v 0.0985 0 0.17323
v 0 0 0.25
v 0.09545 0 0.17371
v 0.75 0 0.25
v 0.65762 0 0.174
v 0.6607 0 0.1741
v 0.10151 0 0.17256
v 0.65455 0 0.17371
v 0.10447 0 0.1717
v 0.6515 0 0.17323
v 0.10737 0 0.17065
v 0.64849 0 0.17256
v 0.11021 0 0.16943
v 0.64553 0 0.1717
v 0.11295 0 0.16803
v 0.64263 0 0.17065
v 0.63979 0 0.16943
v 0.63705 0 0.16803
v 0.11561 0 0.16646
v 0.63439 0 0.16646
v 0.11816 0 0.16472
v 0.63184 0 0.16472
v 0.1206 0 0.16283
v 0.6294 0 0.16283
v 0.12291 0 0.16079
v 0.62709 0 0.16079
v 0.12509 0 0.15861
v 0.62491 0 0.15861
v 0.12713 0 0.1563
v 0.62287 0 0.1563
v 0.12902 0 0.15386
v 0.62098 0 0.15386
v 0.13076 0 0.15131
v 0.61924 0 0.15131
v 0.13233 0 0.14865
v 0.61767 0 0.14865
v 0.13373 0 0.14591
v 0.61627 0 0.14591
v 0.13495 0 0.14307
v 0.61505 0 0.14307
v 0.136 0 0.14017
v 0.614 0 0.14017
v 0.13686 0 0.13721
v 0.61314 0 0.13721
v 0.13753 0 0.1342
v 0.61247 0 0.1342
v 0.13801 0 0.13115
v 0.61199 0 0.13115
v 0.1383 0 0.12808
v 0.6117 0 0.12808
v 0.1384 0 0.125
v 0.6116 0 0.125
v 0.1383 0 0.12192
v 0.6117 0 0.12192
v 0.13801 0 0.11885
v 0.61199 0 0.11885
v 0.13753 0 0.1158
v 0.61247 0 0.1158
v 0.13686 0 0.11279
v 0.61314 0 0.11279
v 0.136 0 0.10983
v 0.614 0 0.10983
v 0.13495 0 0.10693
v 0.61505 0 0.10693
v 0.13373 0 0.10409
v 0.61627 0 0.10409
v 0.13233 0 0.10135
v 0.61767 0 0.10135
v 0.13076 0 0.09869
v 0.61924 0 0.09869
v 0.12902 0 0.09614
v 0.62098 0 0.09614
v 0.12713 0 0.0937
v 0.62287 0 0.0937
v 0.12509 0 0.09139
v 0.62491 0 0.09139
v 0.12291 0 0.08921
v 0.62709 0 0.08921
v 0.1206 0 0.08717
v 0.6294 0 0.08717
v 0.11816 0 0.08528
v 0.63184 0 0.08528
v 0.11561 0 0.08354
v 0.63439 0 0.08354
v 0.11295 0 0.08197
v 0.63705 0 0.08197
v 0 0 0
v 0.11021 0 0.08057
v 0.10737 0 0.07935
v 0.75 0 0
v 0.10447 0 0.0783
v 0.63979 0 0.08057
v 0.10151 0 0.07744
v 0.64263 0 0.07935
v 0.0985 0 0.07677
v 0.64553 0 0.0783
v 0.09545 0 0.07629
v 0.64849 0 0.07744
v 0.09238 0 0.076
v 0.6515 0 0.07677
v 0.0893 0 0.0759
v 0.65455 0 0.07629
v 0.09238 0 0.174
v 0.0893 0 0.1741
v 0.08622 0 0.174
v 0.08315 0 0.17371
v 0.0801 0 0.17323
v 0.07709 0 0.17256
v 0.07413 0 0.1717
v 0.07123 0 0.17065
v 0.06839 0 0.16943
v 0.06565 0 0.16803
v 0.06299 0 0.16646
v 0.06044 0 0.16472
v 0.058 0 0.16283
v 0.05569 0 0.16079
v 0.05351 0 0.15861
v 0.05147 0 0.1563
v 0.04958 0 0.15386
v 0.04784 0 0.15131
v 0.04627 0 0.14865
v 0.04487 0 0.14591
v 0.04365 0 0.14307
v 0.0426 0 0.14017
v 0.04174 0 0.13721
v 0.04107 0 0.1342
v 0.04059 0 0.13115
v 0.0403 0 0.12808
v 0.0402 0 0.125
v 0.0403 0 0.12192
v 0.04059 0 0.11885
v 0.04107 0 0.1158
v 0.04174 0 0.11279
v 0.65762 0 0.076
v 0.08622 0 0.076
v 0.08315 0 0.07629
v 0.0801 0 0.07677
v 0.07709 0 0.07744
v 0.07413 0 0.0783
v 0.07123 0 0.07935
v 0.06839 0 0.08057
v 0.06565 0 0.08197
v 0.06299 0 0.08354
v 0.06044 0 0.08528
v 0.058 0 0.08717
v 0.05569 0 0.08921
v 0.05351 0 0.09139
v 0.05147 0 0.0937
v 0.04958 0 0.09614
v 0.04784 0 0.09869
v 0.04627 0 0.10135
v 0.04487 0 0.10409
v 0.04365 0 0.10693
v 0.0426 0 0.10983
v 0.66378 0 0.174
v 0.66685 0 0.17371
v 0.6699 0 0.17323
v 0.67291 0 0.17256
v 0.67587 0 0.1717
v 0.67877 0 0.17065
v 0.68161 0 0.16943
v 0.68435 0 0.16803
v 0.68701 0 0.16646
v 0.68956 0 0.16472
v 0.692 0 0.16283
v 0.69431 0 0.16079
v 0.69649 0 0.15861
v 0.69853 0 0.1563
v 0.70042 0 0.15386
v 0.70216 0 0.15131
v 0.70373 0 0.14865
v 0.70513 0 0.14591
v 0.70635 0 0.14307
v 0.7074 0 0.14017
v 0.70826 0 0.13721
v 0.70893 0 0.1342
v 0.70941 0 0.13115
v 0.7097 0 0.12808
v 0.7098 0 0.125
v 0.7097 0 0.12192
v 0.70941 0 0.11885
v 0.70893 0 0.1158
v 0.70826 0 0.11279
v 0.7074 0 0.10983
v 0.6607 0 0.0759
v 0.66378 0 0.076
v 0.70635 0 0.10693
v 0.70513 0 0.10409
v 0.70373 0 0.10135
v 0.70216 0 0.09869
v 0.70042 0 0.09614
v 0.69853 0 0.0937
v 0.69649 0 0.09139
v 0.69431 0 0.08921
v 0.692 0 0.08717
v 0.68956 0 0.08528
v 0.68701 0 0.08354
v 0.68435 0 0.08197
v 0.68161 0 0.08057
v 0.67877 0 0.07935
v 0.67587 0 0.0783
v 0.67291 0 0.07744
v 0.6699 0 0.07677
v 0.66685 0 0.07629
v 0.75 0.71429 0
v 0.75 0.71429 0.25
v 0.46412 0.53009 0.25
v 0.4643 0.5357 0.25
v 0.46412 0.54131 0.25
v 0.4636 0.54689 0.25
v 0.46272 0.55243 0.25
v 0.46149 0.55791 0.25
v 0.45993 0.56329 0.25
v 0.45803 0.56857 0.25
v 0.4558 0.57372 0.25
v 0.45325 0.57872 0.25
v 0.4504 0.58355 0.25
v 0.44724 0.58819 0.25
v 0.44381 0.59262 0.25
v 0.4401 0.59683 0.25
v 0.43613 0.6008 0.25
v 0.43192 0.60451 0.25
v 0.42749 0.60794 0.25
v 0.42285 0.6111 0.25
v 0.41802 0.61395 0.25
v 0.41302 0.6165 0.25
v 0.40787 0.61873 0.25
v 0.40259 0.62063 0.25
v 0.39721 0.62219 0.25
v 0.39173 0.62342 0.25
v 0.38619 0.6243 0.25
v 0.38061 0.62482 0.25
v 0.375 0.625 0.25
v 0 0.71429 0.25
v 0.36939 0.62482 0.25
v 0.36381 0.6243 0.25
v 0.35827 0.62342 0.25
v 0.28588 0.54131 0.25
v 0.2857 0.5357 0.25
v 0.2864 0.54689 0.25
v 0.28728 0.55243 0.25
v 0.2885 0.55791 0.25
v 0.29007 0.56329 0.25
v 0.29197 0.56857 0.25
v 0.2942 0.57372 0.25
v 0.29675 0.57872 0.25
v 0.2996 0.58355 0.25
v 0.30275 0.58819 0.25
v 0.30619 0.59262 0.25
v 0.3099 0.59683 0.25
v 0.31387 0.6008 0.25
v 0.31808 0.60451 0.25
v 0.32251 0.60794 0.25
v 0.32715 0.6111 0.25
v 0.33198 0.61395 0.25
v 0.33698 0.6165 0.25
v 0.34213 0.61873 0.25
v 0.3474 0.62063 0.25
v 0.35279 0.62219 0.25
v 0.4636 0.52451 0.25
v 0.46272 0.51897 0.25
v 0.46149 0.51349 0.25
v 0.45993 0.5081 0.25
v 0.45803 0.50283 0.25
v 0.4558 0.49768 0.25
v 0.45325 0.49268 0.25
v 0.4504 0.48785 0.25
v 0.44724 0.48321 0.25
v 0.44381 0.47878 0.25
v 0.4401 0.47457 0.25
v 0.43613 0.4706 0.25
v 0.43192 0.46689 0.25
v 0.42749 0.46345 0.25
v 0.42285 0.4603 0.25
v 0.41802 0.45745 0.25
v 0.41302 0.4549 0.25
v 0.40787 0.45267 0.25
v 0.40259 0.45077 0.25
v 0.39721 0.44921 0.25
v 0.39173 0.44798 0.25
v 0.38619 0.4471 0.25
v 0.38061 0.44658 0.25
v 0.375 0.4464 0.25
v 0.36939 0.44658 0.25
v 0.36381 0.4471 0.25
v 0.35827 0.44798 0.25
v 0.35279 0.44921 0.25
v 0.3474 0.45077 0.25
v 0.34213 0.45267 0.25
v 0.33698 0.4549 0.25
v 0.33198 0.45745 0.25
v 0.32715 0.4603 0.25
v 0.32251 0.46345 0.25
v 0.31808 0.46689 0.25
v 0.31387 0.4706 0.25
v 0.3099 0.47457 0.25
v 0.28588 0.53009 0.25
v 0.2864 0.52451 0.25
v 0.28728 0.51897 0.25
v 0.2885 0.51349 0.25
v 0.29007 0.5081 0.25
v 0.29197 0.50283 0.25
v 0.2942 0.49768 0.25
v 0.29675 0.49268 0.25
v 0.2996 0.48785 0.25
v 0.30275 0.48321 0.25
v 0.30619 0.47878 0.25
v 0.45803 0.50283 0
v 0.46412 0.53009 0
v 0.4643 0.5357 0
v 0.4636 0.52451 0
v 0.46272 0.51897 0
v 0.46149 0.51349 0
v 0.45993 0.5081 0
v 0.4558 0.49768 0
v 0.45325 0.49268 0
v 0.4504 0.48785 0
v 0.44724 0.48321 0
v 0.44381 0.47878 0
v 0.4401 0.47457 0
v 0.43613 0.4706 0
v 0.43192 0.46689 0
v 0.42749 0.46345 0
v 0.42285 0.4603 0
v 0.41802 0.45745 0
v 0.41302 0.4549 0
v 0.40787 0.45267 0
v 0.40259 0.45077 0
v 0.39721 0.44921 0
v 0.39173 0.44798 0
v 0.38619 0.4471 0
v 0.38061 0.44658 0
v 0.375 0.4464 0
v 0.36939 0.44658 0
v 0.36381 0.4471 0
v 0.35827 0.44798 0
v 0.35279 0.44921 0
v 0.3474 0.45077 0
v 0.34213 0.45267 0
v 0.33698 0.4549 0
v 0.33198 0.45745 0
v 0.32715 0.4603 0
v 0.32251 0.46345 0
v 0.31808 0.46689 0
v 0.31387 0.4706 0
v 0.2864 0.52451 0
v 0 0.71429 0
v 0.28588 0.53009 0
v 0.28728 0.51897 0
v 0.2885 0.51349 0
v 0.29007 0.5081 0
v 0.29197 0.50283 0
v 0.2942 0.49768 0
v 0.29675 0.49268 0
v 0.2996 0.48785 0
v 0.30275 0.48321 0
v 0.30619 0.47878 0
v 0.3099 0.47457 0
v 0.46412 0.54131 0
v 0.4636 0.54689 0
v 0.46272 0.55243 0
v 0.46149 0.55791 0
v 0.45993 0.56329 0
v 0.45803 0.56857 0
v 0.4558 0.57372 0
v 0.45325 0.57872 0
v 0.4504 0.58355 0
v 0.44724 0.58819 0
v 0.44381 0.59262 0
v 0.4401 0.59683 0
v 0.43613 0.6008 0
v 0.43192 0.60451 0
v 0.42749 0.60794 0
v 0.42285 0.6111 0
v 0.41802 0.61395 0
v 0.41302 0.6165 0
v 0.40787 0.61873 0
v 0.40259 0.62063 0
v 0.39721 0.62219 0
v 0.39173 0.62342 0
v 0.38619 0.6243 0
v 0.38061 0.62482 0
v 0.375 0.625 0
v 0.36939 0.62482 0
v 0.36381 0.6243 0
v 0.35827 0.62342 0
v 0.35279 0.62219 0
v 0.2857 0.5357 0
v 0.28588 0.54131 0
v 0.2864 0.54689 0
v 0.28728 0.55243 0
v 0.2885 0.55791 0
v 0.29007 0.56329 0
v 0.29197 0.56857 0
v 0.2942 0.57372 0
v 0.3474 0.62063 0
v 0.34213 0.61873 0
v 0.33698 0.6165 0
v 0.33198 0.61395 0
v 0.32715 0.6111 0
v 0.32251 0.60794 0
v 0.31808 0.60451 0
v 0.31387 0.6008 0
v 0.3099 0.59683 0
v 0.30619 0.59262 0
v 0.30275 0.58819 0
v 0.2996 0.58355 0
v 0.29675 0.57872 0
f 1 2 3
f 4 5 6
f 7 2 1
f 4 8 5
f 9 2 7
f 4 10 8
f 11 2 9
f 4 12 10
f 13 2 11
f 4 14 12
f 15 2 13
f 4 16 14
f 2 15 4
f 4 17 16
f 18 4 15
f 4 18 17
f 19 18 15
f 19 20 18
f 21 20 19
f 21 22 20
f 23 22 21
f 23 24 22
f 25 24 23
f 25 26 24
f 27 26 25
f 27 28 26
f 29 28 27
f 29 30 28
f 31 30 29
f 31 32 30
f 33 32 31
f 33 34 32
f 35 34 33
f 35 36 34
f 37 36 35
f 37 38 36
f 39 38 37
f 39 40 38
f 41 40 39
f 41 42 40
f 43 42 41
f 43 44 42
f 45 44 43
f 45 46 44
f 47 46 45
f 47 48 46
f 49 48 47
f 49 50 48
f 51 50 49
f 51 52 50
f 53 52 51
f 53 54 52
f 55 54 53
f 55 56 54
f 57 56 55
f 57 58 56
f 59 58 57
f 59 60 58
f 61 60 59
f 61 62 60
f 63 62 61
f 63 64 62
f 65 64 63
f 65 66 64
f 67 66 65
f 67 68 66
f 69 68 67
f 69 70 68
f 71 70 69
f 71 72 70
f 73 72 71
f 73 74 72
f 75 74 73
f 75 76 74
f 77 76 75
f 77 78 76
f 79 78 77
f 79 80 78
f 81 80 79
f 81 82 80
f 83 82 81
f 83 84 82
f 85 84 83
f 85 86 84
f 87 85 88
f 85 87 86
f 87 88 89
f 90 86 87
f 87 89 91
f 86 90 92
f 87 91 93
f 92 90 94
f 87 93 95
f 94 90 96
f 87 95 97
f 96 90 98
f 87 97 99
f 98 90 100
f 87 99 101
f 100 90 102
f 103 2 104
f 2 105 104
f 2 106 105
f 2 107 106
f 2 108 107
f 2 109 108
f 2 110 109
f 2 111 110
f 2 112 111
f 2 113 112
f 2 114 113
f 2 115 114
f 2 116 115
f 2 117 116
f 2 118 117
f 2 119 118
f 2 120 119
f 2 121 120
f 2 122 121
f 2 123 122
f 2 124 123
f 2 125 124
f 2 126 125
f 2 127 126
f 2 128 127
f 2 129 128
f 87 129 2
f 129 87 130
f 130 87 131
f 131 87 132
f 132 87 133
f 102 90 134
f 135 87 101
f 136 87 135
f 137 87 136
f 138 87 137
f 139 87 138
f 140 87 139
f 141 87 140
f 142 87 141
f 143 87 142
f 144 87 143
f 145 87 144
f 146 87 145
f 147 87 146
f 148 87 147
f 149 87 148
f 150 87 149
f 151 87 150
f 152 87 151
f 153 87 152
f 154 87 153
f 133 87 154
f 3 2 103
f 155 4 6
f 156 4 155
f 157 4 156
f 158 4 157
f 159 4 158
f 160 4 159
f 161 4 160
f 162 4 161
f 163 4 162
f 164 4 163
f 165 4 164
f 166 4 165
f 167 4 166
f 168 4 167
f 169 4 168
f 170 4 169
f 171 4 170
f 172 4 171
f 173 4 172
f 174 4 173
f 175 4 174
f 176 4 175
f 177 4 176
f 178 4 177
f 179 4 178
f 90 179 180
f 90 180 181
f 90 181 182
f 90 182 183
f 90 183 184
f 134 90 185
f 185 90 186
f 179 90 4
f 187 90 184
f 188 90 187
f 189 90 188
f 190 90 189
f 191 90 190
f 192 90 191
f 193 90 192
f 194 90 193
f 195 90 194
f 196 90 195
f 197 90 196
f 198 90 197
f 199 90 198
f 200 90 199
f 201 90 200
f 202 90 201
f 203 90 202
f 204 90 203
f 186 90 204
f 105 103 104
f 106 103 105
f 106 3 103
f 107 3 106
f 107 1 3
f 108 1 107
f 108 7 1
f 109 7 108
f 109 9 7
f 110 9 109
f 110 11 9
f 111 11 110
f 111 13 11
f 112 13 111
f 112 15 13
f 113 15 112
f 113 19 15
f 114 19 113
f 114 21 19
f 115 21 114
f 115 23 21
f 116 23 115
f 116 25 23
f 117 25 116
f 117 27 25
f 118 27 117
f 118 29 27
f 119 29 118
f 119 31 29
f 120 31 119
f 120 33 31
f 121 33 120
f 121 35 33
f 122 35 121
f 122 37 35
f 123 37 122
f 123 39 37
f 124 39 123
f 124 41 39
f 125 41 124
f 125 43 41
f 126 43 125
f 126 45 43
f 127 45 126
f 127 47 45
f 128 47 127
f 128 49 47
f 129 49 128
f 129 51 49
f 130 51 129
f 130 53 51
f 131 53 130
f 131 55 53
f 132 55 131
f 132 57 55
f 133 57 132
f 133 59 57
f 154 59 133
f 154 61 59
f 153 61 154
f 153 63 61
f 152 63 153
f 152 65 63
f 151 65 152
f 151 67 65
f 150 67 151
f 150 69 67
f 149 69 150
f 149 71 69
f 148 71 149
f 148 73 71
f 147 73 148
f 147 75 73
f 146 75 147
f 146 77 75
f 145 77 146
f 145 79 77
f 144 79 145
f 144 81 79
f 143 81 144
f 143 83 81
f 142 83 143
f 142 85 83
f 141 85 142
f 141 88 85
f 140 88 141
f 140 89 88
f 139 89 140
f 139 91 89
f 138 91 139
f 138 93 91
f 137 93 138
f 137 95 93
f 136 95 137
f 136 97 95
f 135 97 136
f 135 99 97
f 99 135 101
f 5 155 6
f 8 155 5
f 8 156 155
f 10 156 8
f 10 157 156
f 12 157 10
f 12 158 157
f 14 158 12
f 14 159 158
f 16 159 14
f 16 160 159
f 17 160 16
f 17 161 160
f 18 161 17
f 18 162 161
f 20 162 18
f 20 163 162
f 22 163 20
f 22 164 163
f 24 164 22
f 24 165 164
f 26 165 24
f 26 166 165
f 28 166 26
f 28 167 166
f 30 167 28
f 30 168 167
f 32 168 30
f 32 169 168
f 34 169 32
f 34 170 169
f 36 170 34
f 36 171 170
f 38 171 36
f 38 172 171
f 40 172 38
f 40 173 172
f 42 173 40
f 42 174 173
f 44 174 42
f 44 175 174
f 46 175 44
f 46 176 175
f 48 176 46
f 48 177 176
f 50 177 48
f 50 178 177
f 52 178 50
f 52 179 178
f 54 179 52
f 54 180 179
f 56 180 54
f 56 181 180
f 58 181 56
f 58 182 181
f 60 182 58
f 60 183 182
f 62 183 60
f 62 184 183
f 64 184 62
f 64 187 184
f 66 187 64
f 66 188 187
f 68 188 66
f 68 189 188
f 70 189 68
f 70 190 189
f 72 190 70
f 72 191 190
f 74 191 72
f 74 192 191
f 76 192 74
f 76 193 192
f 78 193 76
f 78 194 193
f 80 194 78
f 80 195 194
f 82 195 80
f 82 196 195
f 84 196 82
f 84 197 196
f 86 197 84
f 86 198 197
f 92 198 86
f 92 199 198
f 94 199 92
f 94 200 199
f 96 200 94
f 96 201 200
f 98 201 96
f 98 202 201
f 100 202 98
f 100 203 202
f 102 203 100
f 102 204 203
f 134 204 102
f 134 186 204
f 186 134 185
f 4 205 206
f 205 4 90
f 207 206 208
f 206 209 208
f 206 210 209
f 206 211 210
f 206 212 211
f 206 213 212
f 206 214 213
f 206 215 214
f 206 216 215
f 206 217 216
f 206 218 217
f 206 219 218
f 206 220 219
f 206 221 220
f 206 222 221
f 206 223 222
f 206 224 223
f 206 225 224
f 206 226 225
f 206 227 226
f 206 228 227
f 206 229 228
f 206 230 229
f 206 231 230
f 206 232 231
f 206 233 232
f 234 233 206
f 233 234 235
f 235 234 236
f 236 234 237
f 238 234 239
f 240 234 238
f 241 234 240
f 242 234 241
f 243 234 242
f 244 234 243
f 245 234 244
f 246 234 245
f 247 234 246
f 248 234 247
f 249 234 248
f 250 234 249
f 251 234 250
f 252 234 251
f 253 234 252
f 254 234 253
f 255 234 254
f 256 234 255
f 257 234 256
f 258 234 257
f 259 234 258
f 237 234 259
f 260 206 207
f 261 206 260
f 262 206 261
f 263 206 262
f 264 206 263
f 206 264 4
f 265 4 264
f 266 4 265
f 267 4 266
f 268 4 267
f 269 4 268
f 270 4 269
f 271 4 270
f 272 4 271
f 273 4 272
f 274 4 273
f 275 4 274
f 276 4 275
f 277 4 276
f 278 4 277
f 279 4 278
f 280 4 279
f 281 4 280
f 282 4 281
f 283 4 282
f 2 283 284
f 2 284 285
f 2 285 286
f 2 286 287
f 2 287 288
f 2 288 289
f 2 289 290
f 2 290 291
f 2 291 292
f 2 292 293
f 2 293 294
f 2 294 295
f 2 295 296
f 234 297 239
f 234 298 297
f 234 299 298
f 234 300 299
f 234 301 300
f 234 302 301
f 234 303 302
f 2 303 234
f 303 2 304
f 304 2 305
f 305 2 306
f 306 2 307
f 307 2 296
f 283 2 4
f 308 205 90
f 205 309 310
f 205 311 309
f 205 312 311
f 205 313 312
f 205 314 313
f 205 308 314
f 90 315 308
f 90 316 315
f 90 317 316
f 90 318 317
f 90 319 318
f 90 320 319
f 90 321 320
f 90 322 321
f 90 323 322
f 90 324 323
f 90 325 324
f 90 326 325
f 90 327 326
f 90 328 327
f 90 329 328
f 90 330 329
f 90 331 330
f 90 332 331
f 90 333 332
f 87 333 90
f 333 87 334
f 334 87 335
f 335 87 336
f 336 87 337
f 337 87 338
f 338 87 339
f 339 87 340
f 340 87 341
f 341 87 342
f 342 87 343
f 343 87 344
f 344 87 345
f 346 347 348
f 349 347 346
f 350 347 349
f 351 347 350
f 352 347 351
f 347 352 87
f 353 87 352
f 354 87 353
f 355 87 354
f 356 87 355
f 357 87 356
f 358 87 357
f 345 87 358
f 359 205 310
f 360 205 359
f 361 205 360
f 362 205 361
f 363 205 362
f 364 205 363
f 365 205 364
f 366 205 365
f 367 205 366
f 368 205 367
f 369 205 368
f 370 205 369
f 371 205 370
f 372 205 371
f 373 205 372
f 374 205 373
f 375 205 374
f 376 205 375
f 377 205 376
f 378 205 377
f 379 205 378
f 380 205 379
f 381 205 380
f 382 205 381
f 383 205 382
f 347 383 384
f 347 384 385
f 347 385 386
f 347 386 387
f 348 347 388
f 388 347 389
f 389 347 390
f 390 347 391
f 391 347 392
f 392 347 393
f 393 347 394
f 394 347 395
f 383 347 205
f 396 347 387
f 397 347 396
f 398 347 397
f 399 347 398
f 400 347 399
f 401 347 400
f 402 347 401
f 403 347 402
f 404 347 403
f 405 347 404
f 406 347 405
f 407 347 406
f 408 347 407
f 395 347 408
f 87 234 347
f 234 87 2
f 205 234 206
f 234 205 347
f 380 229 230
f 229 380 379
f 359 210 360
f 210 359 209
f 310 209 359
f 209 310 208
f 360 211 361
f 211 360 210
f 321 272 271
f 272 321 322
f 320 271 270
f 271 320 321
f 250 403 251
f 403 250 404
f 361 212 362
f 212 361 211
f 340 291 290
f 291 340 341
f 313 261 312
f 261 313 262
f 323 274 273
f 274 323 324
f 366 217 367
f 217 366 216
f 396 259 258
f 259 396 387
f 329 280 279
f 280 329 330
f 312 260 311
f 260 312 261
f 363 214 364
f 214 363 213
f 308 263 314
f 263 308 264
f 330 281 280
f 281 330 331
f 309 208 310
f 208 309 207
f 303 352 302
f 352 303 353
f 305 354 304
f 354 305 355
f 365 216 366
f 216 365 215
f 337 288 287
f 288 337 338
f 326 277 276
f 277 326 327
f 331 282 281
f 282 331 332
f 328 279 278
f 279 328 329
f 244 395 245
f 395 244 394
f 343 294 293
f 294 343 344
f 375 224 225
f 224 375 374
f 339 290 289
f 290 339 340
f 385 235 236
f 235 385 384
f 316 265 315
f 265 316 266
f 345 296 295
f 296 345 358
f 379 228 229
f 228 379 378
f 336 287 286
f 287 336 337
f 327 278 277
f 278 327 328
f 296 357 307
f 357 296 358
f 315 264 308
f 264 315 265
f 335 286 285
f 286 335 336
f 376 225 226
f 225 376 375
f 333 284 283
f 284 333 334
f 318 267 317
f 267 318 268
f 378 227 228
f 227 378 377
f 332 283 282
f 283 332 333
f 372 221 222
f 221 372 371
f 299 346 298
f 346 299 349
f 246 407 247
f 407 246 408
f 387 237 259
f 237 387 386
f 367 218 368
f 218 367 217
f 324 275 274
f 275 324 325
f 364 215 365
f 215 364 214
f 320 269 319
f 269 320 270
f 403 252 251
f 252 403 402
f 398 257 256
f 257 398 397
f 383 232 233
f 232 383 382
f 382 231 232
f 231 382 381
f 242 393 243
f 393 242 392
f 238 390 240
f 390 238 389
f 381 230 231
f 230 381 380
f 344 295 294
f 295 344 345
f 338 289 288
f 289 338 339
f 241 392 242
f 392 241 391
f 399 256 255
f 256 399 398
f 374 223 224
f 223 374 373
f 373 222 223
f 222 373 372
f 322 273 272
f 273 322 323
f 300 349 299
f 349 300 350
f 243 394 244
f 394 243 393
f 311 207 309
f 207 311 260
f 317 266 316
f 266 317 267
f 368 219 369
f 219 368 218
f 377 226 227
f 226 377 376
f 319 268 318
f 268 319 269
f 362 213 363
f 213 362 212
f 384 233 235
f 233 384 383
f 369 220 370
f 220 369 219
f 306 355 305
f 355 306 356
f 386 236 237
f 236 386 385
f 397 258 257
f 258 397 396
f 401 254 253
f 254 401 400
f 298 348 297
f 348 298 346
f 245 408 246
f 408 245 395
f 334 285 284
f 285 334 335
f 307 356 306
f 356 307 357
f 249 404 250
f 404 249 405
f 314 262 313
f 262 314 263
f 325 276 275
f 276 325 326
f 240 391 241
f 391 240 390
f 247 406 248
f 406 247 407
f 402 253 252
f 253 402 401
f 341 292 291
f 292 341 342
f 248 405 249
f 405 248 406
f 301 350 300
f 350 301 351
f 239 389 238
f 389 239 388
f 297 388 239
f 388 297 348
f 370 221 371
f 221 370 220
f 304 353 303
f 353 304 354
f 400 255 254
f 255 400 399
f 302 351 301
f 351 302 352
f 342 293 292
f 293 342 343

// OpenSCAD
// Stepped Block with Circular Openings
// All dimensions in inches

// Main block dimensions
block_length = 0.75;      // Overall length
block_width = 0.714286;   // Overall width  
block_height = 0.25;      // Overall height
extrusion_depth = 0.25;   // Main extrusion depth

// Upper through-opening parameters
through_hole_x = 0.375;   // Distance from left edge
through_hole_y = 0.5357;  // Distance from front edge
through_hole_r = 0.0893;  // Radius

// Side blind hole parameters
side_hole_r = 0.0491;     // Radius of side holes
side_hole_depth = 0.1071; // Depth of cut into block
side_hole_left_x = 0.0893;  // Left hole position
side_hole_right_x = 0.6607; // Right hole position
side_hole_z_start = 0.0759; // Bottom of hole band
side_hole_z_end = 0.1741;   // Top of hole band

// Resolution for smooth curves
$fn = 100;

// Main stepped block
module main_block() {
    // Create rectangular block with given dimensions
    cube([block_length, block_width, block_height]);
}

// Upper through-opening (vertical cylinder)
module through_opening() {
    translate([through_hole_x, through_hole_y, 0])
        cylinder(h = block_height + 0.01, r = through_hole_r, center = false);
}

// Side blind hole (horizontal cylinder limited to band)
module side_blind_hole(x_position) {
    // Calculate vertical center of hole band
    z_center = (side_hole_z_start + side_hole_z_end) / 2;
    band_height = side_hole_z_end - side_hole_z_start;
    
    // Position at front face, oriented along Y-axis
    translate([x_position, 0, z_center])
        rotate([-90, 0, 0])  // Orient cylinder along Y-axis
        // Create cylinder and limit to band height
        intersection() {
            cylinder(h = side_hole_depth, r = side_hole_r, center = false);
            // Limit cylinder to hole band height
            translate([0, 0, -band_height/2])
                cube([side_hole_r*2, side_hole_r*2, band_height], center = true);
        }
}

// Complete model with all features
difference() {
    // Start with main block
    main_block();
    
    // Subtract upper through-opening
    through_opening();
    
    // Subtract left side blind hole
    side_blind_hole(side_hole_left_x);
    
    // Subtract right side blind hole
    side_blind_hole(side_hole_right_x);
}
